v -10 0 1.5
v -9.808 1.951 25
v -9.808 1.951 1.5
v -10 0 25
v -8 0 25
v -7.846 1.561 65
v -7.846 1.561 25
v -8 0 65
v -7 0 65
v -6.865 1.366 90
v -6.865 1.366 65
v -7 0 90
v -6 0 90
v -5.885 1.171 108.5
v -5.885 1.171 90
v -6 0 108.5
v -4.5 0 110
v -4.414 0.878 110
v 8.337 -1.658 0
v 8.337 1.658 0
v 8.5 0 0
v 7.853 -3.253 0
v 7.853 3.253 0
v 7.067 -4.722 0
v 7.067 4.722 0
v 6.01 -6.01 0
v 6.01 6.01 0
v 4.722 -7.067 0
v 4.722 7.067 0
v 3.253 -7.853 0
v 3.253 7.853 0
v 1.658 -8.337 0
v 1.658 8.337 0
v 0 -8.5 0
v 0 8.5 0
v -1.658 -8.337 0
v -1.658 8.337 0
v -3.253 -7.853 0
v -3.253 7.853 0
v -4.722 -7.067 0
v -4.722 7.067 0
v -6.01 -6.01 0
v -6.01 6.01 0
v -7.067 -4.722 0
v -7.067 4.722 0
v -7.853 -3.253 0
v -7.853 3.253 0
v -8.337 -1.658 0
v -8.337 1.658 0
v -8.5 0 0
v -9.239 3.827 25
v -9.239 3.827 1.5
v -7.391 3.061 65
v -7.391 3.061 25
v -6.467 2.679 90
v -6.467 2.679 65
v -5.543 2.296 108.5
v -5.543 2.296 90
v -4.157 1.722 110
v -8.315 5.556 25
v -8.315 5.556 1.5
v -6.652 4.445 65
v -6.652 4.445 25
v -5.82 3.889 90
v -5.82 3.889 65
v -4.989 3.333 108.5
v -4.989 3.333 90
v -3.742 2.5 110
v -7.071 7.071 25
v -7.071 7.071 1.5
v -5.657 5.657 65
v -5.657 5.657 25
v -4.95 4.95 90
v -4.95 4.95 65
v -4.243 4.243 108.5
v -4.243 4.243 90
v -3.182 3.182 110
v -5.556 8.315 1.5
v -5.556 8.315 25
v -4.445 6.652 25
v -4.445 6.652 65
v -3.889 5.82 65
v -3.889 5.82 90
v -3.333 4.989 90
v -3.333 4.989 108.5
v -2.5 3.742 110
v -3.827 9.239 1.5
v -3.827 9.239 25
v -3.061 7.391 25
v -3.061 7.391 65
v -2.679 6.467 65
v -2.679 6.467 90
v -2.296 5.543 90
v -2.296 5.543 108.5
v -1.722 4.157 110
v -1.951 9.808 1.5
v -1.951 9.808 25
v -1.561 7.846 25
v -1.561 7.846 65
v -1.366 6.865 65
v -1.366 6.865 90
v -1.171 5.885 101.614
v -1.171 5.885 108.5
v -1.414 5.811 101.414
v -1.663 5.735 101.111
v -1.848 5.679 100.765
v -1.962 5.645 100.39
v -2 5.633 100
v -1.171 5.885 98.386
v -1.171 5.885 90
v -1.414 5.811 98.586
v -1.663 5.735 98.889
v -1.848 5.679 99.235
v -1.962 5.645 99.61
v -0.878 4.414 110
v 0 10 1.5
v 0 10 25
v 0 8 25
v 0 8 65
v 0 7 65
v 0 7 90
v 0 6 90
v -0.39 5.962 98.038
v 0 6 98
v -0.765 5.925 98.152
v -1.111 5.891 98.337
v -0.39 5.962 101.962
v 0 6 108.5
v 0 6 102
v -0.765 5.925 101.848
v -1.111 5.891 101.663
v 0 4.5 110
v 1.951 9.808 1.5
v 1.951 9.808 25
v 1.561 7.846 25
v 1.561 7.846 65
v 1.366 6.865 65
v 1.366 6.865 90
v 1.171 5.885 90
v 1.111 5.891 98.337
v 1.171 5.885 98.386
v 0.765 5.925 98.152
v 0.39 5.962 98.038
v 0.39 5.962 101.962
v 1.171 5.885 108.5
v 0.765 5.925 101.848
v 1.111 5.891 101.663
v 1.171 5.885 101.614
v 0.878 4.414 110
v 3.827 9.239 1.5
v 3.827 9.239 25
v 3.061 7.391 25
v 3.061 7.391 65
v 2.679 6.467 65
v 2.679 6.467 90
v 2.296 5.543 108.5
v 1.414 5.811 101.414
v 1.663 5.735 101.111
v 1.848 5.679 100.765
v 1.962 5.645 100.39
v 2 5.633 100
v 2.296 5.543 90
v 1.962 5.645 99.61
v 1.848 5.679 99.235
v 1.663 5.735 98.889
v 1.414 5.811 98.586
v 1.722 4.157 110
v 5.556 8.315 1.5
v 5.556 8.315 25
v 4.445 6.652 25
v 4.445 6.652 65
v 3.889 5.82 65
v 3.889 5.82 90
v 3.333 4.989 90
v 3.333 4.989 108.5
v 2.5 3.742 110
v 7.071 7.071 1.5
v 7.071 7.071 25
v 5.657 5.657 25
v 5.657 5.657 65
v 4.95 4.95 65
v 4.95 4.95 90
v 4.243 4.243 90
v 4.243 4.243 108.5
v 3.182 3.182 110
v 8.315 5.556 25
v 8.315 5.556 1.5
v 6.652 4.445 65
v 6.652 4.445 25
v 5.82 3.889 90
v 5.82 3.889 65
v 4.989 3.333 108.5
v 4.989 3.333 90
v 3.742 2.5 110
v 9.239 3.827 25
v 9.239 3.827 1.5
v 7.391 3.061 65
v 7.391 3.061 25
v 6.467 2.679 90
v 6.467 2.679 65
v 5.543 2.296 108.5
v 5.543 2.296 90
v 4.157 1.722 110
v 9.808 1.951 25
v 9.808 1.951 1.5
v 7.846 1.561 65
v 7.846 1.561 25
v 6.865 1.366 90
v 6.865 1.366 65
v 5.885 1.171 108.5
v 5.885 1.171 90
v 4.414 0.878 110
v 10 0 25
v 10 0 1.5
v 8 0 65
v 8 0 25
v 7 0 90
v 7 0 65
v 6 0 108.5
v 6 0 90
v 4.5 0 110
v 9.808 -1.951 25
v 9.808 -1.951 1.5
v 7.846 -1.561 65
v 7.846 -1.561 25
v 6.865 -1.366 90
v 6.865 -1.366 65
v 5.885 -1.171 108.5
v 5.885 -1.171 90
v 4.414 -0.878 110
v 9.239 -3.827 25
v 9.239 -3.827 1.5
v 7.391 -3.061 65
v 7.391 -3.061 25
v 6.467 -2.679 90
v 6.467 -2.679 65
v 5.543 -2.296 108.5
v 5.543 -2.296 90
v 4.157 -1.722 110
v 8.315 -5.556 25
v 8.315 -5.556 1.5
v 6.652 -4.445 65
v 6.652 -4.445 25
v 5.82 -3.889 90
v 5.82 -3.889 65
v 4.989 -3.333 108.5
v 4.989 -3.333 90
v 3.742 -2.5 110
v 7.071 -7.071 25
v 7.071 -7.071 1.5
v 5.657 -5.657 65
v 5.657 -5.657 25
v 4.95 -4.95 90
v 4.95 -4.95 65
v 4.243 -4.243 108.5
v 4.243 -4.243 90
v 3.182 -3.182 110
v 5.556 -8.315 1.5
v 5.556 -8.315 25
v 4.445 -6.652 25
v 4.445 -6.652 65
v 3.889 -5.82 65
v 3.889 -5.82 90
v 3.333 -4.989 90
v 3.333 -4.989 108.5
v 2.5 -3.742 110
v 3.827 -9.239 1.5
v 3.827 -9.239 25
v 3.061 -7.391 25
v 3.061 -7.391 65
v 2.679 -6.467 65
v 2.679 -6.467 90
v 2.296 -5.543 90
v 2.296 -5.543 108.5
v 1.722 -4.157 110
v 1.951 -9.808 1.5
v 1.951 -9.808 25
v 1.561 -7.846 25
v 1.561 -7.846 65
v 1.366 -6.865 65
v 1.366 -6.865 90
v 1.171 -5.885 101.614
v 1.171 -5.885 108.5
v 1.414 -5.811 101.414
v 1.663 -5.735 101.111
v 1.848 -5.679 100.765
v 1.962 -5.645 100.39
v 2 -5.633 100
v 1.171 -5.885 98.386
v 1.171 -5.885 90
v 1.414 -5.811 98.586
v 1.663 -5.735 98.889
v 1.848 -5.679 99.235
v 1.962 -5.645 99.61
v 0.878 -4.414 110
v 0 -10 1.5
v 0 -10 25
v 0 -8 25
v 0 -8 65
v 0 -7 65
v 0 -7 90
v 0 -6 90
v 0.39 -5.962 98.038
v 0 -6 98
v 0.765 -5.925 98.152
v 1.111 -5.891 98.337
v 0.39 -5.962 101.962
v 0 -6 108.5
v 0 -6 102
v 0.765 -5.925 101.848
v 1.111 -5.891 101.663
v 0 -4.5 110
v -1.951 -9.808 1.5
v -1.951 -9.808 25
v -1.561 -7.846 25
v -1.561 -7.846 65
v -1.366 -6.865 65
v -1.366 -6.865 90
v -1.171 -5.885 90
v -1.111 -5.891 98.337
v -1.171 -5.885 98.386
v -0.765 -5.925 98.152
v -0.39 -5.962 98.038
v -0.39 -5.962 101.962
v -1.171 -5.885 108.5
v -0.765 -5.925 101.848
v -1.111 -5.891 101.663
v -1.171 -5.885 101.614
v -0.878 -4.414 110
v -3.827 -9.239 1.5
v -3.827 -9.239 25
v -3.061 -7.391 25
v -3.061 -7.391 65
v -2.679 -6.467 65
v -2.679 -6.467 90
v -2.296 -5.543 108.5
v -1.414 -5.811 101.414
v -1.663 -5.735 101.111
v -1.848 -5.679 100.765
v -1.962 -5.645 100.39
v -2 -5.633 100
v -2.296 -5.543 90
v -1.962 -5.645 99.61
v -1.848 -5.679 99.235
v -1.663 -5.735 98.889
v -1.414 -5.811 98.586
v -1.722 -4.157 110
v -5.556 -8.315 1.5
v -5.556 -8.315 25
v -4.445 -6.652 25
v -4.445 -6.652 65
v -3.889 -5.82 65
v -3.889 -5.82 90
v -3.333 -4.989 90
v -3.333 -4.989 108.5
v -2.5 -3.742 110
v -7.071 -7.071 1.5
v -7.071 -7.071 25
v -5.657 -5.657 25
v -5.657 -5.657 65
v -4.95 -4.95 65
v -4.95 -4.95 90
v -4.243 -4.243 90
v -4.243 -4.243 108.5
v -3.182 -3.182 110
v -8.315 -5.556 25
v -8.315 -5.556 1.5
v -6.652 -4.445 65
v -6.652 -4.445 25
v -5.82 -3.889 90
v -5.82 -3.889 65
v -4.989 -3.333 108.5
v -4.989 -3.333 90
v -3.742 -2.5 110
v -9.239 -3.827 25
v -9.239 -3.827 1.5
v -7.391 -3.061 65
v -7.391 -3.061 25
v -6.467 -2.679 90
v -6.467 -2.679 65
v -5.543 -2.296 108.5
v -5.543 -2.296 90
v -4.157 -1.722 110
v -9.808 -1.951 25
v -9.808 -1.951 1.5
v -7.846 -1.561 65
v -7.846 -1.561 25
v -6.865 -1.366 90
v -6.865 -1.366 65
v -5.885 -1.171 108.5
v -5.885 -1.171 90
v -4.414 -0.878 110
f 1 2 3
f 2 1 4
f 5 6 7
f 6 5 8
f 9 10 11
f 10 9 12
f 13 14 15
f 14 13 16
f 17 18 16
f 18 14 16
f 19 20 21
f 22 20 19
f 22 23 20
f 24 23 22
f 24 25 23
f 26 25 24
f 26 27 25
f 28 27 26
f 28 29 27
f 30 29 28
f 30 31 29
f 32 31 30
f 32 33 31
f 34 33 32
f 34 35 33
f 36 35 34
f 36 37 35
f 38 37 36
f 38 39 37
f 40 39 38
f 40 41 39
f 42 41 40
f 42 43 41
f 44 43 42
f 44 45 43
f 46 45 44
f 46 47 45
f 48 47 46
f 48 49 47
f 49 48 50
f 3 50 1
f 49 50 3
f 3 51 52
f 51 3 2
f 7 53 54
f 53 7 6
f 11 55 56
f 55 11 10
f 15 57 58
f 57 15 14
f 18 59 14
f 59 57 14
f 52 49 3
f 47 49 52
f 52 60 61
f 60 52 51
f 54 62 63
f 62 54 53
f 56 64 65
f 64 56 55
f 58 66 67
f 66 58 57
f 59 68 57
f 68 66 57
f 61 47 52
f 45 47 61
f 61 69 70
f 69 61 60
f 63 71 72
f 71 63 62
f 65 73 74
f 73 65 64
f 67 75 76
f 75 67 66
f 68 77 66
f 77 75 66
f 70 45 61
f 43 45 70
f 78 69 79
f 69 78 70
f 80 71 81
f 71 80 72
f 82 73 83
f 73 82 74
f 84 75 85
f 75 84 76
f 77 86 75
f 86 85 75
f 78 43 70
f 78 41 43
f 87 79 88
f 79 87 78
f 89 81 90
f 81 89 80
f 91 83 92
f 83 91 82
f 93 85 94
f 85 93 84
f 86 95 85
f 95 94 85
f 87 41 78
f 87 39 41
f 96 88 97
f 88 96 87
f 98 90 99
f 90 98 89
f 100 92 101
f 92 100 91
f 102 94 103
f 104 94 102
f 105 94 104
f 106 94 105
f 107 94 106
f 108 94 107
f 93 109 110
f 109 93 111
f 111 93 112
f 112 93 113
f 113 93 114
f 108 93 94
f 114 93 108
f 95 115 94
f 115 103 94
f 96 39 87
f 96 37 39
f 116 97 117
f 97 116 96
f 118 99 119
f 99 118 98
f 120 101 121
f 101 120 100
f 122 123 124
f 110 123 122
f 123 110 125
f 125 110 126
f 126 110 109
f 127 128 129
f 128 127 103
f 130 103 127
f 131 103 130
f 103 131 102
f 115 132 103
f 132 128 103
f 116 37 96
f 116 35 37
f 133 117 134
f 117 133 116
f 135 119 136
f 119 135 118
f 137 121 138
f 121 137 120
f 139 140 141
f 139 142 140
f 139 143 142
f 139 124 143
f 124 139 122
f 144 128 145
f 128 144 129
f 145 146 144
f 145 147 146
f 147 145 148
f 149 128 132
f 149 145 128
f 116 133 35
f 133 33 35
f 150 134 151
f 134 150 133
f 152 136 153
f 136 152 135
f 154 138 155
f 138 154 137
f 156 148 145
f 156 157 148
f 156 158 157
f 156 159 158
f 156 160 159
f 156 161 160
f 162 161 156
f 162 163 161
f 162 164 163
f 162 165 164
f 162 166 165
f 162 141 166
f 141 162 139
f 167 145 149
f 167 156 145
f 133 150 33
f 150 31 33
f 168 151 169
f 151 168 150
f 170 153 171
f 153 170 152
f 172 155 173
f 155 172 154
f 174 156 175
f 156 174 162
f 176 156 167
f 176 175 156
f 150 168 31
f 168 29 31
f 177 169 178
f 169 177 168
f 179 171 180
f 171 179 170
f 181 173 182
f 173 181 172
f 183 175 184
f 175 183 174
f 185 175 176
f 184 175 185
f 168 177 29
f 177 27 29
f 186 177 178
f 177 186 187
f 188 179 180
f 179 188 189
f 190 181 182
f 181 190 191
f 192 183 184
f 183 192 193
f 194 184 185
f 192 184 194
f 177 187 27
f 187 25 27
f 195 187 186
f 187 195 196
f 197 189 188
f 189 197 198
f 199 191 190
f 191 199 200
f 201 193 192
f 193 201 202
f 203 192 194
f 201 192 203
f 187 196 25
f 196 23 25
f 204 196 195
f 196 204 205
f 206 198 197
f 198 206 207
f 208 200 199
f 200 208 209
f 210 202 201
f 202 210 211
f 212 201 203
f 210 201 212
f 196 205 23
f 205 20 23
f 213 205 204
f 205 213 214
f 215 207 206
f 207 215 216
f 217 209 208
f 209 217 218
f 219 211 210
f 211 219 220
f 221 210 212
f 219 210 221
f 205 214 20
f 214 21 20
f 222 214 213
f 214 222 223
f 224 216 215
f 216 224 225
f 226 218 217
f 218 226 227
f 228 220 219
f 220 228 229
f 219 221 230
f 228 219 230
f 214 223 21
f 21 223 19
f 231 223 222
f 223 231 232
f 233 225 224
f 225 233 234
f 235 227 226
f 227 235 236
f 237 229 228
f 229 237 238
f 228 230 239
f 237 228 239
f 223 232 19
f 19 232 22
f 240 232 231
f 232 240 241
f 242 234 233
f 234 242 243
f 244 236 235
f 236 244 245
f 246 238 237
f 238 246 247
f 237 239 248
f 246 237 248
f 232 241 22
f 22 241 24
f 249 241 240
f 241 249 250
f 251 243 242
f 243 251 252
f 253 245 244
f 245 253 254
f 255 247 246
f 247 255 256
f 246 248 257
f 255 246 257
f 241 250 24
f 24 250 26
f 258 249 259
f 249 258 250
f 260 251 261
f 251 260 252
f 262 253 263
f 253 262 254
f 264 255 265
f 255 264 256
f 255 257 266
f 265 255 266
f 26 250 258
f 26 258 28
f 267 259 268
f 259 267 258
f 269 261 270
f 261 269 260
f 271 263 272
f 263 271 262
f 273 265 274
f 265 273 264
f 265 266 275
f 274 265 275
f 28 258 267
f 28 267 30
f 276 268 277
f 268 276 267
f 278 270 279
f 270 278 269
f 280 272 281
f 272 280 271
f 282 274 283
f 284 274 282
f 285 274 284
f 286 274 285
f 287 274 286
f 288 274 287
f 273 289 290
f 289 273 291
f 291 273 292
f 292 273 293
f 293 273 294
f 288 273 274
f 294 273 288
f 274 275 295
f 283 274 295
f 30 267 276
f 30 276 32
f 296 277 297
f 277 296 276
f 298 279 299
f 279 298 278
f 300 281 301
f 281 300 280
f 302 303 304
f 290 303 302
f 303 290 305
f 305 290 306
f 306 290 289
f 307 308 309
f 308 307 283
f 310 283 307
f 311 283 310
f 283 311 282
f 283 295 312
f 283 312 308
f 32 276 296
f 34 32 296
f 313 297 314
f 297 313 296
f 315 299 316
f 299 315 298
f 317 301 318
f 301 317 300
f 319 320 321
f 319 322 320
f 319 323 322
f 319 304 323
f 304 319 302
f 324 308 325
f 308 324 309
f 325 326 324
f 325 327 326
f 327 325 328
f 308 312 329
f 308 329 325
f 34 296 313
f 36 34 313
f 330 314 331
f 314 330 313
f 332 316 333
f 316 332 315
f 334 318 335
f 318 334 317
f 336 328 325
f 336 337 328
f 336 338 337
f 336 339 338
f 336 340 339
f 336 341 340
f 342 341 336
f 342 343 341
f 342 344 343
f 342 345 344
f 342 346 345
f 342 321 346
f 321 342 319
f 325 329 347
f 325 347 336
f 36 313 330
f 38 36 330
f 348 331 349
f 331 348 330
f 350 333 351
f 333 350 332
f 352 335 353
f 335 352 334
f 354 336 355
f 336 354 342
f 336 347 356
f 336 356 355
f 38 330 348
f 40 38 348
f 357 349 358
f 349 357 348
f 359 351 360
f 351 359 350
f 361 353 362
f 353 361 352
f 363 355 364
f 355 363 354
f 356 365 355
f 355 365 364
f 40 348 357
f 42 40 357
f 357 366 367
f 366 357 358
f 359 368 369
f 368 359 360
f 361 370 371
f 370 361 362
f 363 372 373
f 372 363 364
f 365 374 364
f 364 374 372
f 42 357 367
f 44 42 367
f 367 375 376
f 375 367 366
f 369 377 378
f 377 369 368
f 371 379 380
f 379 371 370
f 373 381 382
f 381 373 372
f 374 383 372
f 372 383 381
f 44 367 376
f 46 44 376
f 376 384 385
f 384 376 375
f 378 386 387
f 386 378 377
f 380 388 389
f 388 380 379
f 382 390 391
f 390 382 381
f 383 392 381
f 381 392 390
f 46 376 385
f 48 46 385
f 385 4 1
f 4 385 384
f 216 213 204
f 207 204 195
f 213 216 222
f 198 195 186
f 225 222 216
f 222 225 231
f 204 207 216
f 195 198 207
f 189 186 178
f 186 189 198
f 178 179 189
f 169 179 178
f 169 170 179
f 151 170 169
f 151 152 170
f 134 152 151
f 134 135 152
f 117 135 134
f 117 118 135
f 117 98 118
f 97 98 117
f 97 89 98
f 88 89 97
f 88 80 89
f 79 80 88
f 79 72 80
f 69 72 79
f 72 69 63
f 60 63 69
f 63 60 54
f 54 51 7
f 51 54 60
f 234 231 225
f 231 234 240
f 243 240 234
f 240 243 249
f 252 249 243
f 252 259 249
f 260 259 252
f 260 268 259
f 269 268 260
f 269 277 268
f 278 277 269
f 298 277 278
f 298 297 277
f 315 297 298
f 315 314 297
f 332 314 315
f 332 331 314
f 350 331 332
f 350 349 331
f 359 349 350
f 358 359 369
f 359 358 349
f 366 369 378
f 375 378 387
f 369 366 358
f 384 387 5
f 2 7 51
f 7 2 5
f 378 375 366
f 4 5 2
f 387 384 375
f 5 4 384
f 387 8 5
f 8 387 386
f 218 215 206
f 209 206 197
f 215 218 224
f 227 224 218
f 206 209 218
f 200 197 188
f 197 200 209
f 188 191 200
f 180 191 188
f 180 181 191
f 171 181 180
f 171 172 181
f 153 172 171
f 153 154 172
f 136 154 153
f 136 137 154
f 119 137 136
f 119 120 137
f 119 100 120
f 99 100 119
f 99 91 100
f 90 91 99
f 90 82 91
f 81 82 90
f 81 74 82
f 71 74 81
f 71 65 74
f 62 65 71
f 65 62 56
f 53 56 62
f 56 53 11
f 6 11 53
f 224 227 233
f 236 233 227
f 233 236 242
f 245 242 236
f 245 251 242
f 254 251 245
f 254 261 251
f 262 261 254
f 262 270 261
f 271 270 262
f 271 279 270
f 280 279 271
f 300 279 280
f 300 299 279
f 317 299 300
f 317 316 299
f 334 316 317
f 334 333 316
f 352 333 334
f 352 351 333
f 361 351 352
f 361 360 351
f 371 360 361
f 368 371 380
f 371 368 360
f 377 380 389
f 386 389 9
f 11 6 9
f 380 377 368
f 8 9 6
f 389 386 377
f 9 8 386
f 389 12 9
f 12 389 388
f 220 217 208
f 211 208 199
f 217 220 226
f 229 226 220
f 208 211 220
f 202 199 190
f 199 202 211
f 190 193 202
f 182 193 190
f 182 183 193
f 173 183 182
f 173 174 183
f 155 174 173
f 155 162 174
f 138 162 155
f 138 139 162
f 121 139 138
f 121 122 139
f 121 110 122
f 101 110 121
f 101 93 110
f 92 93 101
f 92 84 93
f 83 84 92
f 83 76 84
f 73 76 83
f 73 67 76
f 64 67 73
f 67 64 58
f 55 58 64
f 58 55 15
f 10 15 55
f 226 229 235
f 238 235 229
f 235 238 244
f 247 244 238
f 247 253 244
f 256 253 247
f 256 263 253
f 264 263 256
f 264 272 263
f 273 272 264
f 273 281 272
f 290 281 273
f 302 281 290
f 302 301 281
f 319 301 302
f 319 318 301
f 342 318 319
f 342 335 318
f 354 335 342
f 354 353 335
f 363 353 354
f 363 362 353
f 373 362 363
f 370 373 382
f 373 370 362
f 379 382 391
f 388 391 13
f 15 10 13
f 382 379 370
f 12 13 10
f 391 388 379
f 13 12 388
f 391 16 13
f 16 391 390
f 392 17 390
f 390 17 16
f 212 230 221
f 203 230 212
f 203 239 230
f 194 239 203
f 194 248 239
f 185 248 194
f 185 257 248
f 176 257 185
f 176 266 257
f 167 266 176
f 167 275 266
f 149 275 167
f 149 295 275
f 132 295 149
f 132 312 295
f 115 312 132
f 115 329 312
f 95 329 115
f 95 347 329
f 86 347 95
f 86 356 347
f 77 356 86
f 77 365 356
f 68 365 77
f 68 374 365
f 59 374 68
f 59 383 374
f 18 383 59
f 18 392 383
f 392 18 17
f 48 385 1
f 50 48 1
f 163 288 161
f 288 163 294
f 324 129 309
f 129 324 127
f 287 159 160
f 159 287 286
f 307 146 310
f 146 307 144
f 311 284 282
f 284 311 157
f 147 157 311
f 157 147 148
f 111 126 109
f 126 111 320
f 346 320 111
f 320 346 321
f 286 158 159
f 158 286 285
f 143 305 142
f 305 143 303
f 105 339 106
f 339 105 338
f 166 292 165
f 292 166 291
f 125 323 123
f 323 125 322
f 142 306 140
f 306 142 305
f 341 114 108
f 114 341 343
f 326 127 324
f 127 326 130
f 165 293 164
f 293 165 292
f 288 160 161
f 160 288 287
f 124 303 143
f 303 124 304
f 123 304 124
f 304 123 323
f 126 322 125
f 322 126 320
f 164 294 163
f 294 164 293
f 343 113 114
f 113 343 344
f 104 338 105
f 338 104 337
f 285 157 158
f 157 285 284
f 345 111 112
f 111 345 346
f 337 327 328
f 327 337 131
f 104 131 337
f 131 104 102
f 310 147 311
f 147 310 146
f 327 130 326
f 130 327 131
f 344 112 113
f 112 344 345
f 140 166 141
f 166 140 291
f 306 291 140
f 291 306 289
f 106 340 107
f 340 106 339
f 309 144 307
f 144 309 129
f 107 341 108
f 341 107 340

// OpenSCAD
$fn = 32;

// ----------------------------------------------------------------------
// Stepped shaft: diameters 20, 16, 14, 12 mm, 110 mm long
// ----------------------------------------------------------------------

// --- parameters (mm) ---
d1 = 20;                  // step 1 diameter
len1 = 25;                // step 1 length
d2 = 16;                  // step 2 diameter
len2 = 40;                // step 2 length
d3 = 14;                  // step 3 diameter
len3 = 25;                // step 3 length
d4 = 12;                  // step 4 diameter
len4 = 20;                // step 4 length
total = 110;              // overall length
chamfer = 1.5;            // end chamfer
cross_d = 4;              // cross pin hole
cross_z = 100;            // cross hole position

/* closed turning profile: x is the radius, y is the length */
profile = [[0, 0], [10 - chamfer, 0], [10, chamfer], [10, 25], [8, 25], [8, 65], [7, 65], [7, 90], [6, 90], [6, 108.5], [4.5, 110], [0, 110]];

difference() {
  rotate_extrude() polygon(profile);
  /* cross pin hole through the small step */
  translate([0, 0, cross_z]) rotate([90, 0, 0]) cylinder(h = d4 + 4, d = cross_d, center = true);
}
